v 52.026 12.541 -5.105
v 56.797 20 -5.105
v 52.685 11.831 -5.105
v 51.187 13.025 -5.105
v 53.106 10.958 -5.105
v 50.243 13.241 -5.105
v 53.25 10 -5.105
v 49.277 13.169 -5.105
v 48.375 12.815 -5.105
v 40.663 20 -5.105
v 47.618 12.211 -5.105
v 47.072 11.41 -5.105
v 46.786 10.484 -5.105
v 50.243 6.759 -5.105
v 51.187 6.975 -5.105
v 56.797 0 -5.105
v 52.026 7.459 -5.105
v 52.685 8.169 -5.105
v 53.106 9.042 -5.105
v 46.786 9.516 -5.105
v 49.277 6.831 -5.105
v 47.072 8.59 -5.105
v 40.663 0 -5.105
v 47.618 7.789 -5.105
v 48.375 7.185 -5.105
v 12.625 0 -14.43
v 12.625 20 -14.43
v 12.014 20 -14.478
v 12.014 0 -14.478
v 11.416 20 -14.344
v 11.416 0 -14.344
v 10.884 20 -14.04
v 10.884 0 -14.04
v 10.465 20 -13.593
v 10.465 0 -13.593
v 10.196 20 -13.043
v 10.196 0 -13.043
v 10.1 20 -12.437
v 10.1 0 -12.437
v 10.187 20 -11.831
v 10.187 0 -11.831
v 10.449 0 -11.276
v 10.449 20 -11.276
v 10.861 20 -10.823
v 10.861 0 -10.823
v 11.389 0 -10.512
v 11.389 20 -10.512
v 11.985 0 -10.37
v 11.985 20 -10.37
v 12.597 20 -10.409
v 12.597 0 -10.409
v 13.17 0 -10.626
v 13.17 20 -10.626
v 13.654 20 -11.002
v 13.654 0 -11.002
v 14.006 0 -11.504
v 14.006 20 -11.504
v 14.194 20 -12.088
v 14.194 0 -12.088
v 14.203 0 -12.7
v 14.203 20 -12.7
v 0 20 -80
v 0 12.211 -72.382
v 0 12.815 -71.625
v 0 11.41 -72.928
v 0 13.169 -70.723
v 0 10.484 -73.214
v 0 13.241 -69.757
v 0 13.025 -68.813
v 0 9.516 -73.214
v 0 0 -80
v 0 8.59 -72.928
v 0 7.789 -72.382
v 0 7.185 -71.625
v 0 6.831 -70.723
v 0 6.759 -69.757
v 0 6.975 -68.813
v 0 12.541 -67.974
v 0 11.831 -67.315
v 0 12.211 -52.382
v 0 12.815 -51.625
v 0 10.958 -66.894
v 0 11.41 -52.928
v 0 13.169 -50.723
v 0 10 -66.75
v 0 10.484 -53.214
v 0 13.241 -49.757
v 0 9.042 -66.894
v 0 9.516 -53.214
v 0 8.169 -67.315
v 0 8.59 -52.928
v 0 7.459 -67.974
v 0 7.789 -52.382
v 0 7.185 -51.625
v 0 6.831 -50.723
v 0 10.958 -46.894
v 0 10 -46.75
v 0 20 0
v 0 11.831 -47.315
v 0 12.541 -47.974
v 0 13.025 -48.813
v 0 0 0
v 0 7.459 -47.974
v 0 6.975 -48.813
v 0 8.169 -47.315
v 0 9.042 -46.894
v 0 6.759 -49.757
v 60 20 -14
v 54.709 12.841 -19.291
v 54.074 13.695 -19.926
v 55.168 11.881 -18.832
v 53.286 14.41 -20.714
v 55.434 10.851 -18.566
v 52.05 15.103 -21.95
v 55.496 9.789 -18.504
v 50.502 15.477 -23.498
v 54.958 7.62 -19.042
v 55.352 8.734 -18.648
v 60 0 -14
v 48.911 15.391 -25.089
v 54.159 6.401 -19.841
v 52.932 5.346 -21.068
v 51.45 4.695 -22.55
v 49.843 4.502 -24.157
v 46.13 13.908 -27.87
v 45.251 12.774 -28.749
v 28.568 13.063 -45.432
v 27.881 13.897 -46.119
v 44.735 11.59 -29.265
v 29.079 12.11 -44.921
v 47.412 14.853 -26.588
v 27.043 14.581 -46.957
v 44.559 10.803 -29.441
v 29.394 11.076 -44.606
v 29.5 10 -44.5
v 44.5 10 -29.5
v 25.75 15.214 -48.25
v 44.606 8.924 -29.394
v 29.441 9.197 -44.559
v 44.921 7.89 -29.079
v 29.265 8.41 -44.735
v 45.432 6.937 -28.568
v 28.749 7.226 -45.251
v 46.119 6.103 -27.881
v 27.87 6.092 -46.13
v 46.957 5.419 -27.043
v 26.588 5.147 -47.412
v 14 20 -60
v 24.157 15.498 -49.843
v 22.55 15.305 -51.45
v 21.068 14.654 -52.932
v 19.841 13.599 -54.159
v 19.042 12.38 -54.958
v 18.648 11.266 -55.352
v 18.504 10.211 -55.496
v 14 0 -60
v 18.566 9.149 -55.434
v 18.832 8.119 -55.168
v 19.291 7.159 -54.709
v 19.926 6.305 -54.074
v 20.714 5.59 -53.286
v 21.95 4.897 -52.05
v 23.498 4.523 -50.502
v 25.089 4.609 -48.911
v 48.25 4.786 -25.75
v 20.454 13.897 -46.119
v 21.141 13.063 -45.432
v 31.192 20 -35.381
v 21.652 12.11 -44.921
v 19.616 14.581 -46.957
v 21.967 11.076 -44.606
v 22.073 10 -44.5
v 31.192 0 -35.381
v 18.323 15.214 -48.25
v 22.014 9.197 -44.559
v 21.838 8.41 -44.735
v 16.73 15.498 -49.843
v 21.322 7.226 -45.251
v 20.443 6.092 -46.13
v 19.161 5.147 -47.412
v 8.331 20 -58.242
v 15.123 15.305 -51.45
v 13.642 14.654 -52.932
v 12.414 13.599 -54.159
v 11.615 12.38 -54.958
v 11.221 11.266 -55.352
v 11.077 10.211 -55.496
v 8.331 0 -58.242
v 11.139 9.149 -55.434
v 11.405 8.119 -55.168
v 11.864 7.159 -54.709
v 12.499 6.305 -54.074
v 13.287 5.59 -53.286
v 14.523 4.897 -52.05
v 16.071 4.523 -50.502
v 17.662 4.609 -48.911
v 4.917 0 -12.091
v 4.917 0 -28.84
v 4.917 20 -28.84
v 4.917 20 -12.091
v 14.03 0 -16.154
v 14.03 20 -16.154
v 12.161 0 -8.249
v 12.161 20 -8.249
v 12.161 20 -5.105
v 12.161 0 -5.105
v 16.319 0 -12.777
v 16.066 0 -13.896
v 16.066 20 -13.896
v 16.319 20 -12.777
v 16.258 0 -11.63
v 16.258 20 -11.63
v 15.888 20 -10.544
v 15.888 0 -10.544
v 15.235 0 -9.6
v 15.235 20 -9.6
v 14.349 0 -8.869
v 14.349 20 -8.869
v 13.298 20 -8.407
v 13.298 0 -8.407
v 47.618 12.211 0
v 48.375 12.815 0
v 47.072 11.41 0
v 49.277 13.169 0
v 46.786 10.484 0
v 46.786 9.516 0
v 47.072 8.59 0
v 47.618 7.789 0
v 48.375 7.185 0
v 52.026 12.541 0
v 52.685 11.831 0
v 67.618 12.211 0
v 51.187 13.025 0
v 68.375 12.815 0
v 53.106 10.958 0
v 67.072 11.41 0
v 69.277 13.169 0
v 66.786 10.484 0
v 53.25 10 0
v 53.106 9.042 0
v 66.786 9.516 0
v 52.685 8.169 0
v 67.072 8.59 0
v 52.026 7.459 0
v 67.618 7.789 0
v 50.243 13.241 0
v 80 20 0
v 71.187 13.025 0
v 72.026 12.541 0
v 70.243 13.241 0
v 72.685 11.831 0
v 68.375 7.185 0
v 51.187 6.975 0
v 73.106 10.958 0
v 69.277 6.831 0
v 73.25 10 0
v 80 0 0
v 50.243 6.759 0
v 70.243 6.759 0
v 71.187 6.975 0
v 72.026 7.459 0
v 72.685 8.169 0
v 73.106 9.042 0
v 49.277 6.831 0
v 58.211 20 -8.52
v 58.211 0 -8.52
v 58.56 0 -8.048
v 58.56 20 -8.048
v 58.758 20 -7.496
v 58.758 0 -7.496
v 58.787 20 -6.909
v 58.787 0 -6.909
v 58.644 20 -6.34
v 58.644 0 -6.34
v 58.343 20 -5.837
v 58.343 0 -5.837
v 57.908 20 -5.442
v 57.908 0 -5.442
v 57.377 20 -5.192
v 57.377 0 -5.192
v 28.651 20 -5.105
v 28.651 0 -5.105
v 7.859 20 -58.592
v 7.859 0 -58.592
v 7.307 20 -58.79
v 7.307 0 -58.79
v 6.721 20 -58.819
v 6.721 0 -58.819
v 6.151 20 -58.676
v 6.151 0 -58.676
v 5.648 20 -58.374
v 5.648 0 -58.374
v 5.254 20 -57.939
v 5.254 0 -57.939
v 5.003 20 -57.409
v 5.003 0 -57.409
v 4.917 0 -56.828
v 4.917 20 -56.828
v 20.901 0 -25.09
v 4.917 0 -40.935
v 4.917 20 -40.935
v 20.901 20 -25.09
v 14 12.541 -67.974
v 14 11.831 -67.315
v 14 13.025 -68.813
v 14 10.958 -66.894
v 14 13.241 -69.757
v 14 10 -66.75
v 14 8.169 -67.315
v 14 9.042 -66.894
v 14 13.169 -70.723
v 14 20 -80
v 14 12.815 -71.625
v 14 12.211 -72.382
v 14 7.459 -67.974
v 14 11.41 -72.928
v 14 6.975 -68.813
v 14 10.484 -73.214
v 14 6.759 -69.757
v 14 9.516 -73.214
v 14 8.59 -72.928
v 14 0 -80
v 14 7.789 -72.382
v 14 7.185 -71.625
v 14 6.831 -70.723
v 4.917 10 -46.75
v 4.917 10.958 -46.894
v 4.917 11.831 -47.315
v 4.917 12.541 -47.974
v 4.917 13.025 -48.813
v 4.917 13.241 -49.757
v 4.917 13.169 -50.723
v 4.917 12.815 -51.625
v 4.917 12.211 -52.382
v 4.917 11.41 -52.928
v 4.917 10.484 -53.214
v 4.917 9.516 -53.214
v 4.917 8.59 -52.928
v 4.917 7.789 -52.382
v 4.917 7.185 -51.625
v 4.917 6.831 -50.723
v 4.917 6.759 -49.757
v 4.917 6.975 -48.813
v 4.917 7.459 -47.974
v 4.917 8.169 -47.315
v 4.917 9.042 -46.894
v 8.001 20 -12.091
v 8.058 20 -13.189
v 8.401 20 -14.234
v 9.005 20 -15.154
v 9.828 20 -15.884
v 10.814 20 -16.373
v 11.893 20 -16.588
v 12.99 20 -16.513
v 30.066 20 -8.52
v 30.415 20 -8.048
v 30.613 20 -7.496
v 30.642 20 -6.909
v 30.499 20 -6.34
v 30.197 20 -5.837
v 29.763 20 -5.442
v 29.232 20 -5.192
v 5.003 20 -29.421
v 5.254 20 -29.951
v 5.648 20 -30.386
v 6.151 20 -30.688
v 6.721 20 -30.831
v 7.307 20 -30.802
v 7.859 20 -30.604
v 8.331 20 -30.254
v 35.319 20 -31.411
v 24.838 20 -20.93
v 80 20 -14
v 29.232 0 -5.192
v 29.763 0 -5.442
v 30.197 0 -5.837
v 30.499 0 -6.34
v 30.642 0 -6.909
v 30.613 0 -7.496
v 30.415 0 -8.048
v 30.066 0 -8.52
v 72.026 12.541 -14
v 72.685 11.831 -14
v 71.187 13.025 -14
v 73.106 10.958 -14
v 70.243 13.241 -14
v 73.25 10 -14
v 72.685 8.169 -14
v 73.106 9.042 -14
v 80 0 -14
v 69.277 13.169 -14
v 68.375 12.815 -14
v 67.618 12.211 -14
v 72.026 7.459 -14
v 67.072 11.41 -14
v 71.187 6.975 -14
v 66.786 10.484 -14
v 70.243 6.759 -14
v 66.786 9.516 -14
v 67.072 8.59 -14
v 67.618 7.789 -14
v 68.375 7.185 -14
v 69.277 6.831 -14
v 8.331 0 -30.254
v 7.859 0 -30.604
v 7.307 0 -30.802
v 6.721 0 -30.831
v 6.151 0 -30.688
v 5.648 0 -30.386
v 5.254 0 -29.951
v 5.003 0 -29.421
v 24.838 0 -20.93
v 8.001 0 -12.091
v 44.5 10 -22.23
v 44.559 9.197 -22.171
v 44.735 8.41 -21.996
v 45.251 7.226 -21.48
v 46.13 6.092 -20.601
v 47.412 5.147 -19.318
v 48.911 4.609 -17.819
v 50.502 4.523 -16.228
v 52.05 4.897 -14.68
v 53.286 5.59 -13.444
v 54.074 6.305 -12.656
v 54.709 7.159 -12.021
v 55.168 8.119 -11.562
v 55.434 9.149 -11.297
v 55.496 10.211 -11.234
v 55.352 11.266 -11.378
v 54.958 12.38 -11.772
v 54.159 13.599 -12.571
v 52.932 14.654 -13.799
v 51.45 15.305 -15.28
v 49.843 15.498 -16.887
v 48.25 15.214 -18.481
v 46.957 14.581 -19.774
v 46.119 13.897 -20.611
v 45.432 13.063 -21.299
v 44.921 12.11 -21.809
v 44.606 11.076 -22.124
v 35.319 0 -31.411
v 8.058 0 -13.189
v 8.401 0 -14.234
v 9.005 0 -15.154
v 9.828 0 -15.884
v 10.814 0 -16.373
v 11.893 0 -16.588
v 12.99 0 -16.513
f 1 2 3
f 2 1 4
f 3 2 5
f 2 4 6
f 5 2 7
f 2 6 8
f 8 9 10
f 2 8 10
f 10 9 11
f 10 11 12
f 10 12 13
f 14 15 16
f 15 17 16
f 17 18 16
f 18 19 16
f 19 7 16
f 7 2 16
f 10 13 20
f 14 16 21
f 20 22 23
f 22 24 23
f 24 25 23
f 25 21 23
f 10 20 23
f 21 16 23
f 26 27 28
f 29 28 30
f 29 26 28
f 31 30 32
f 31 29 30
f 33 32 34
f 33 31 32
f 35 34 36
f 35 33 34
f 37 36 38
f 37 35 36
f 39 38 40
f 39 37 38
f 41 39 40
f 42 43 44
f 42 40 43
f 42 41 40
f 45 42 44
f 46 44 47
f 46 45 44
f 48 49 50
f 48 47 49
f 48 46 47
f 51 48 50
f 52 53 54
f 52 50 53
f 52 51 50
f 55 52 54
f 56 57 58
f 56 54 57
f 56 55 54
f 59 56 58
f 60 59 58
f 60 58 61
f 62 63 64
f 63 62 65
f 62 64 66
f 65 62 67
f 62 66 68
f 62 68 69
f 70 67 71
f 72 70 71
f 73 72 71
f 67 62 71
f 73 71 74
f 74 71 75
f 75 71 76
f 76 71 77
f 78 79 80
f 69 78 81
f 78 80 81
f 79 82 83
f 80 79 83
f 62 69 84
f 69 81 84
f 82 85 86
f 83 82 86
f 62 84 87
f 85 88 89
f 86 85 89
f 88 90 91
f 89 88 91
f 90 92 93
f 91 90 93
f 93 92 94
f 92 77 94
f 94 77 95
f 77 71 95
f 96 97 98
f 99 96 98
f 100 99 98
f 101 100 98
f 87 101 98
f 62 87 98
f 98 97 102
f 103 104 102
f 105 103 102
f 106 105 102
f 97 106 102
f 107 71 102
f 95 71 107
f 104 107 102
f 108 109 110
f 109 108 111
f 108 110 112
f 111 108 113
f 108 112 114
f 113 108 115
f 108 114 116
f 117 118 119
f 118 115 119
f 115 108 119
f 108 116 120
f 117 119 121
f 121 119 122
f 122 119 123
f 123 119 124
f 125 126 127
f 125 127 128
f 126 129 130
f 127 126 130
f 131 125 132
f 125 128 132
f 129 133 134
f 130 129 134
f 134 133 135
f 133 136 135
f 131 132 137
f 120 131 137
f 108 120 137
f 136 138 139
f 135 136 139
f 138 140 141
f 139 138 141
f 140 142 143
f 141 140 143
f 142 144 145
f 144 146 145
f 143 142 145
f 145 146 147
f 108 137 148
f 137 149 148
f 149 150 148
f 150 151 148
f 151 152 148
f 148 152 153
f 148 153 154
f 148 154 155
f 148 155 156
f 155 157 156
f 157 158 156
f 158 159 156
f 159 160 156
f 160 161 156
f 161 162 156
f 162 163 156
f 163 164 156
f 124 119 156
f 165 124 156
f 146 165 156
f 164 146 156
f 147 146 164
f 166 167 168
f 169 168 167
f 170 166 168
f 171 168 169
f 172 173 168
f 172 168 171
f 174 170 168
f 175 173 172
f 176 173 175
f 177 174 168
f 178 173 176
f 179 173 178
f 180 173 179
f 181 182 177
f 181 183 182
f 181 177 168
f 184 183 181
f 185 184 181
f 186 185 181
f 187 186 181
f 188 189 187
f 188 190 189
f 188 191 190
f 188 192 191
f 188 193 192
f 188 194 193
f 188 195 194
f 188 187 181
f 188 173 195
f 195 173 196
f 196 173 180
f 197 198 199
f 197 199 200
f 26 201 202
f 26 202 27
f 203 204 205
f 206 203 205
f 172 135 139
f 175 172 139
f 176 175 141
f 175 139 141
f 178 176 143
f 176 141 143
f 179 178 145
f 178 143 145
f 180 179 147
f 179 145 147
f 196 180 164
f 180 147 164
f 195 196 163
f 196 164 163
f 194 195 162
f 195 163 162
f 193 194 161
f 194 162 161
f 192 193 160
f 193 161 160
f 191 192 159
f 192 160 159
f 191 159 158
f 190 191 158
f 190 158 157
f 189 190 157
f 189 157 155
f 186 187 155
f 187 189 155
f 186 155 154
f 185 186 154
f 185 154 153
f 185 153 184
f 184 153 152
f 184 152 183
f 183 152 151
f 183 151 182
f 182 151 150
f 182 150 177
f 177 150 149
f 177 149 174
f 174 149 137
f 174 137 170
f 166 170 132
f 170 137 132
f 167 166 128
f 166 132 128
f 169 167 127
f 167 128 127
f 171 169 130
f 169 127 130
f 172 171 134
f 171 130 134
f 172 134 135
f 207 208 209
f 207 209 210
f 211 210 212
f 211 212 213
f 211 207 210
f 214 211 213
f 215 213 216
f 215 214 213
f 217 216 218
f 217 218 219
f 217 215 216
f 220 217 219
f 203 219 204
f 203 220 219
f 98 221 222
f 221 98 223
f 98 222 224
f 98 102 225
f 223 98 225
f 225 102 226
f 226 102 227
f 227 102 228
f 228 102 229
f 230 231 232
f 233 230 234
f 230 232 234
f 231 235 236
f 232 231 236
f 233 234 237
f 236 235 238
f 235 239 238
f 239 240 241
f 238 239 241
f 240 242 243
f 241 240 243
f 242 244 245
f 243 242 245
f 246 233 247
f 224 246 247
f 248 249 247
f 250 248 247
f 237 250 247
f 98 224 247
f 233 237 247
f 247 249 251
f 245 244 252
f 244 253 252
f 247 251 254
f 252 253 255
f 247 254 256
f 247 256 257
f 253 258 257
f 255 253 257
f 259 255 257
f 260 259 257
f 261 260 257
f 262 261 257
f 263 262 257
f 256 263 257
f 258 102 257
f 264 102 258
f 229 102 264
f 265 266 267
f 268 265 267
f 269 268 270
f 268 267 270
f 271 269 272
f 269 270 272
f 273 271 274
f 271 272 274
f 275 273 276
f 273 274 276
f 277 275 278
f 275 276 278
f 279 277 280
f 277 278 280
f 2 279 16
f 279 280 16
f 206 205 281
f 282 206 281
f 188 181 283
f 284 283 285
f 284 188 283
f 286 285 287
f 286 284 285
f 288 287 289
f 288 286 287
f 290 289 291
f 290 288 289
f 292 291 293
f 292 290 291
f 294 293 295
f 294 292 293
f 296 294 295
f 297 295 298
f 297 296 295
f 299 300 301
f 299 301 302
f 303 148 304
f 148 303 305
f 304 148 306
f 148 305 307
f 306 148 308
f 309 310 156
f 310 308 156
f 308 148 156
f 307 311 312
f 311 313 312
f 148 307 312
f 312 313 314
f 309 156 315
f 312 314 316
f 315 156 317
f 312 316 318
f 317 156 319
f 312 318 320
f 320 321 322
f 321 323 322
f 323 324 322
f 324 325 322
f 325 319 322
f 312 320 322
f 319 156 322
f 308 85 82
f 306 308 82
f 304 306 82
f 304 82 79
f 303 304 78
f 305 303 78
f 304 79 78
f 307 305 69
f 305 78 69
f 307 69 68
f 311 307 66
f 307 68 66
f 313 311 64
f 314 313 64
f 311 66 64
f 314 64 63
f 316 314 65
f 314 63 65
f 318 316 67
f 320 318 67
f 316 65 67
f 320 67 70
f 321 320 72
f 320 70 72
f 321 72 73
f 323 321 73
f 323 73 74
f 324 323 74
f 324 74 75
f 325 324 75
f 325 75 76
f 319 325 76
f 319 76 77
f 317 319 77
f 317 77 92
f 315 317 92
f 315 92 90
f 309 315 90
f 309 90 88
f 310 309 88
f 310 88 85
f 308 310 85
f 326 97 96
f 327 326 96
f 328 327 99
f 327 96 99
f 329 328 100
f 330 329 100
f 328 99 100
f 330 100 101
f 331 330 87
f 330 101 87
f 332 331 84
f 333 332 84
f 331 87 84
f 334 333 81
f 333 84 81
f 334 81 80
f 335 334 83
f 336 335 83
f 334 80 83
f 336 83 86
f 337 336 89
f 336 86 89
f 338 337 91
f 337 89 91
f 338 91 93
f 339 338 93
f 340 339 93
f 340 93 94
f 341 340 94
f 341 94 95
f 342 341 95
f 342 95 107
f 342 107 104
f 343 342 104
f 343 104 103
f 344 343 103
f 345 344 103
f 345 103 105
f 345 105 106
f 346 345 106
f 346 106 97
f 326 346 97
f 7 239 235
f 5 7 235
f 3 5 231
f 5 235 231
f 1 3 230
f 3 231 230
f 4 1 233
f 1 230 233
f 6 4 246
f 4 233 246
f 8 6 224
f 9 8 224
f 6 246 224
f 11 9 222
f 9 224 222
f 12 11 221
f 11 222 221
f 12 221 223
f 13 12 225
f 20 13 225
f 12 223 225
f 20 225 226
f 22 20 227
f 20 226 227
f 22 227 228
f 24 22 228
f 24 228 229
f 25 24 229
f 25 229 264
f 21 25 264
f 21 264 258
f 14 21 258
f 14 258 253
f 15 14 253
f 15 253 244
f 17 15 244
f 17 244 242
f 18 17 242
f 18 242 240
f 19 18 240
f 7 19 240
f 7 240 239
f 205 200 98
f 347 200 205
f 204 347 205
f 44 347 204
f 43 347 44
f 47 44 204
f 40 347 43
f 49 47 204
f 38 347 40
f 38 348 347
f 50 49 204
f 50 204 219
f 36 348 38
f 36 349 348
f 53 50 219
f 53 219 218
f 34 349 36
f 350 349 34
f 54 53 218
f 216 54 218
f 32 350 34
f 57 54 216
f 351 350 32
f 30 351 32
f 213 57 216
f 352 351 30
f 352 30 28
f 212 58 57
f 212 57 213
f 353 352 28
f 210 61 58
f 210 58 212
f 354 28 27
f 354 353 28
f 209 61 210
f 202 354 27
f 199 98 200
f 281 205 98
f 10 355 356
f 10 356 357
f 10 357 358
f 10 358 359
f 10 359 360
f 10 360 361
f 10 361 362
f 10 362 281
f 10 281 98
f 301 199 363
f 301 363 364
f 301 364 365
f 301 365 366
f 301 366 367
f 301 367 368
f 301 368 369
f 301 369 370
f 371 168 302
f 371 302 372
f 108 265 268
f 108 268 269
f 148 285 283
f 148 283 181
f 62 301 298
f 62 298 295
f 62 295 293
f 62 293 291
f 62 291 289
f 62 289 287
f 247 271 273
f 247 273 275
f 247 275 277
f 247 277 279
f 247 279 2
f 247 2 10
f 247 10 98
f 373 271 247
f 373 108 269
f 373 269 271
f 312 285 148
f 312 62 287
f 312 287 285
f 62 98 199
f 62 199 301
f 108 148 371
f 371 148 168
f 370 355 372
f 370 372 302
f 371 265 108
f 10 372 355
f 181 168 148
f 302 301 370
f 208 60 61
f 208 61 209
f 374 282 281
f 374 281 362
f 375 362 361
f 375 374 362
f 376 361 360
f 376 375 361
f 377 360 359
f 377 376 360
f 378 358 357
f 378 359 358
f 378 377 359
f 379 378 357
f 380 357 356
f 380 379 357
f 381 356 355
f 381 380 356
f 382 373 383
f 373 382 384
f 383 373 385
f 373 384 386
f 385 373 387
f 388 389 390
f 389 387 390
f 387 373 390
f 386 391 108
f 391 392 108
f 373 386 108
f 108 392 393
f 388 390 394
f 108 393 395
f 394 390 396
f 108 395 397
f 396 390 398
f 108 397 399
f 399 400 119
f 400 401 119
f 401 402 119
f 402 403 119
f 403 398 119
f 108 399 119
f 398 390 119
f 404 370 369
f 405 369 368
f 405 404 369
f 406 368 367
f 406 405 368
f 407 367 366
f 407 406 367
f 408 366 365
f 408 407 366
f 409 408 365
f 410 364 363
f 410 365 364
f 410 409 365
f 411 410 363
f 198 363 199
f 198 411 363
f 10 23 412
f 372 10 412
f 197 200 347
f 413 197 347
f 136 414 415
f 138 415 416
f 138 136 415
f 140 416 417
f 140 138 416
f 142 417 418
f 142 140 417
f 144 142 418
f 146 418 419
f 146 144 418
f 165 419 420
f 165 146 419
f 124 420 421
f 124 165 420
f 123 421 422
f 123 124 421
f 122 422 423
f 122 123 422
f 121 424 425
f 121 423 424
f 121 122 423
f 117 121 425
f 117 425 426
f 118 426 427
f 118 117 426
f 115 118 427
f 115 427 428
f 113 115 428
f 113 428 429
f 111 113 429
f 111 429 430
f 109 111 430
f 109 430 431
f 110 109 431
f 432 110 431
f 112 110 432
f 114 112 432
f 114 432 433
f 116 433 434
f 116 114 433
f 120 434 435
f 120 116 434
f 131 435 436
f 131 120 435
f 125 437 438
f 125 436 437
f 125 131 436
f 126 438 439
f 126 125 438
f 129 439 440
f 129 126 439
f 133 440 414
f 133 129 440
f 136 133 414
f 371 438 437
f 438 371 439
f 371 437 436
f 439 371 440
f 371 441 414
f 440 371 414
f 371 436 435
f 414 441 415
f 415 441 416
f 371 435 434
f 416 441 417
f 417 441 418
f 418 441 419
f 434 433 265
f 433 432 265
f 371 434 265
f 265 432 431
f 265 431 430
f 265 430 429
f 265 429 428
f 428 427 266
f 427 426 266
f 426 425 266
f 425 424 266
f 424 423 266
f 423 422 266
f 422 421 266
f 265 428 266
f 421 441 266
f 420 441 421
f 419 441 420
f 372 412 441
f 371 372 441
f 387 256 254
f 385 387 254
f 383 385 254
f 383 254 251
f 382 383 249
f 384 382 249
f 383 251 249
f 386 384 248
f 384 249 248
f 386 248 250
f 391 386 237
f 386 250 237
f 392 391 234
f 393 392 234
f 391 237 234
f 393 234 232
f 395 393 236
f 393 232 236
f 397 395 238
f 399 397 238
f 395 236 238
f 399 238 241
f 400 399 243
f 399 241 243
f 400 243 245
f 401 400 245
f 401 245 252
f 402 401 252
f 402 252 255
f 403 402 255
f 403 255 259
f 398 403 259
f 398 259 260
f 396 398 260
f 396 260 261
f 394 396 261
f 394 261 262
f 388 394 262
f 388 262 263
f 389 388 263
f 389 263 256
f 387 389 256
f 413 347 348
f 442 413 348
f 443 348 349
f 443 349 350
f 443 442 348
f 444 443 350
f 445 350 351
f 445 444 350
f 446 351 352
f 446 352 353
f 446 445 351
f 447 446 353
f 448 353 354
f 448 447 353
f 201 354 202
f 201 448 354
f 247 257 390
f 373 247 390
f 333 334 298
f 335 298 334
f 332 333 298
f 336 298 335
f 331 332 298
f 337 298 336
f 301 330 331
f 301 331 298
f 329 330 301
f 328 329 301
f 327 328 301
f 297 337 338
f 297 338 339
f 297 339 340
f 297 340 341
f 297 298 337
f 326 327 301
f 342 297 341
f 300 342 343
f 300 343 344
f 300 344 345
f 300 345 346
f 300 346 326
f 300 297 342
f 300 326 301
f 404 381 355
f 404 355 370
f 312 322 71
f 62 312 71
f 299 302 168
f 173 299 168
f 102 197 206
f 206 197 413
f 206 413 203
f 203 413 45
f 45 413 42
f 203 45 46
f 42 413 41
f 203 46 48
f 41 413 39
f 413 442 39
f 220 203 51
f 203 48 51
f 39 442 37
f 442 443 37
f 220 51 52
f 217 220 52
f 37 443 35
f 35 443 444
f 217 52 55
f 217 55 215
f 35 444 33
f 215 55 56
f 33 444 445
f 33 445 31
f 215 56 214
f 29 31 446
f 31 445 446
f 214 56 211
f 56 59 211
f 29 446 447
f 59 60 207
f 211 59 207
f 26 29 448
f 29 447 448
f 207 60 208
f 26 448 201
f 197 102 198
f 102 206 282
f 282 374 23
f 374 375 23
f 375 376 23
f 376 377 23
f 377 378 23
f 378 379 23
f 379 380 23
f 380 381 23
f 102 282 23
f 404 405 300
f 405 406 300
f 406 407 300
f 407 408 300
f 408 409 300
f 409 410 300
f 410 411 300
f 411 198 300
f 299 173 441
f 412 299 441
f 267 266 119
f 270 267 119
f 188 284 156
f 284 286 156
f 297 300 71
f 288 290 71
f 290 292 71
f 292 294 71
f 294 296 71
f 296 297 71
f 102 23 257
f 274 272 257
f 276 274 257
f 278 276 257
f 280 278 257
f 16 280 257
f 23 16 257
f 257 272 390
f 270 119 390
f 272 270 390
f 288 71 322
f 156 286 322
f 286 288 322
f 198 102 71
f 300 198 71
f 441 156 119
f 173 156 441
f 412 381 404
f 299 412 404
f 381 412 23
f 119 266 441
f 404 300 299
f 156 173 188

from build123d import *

# Parameters (mm, degrees)
EXTRUDE_1_DEPTH     = 20
SKETCH_2_R          = 3.25
CUT_EXTRUDE_1_DEPTH = 115.891252931
SKETCH_3_R          = 3.25
CUT_EXTRUDE_2_DEPTH = 115.891252931
CUT_EXTRUDE_3_DEPTH = 115.891252931
SKETCH_7_R          = 5.5
CUT_EXTRUDE_4_DEPTH = 25
SKETCH_8_R          = 5.5
CUT_EXTRUDE_5_DEPTH = 25


with BuildPart() as part:
    # 草图1 → 凸台-拉伸1 (new body)
    with BuildSketch(Plane(origin=(0, 0, 0), x_dir=(1, 0, 0), z_dir=(0, 1, 0))):
        Polygon((0, 80), (0, 0), (80, 0), (80, 14), (60, 14), (14, 60), (14, 80), align=None)
    extrude(amount=EXTRUDE_1_DEPTH)

    # 草图2 → 切除-拉伸1 (cut, through all)
    with BuildSketch(Plane.ZY):
        with Locations((-70, 10)):
            Circle(SKETCH_2_R)
        with Locations((-50, 10)):
            Circle(SKETCH_2_R)
    extrude(amount=-CUT_EXTRUDE_1_DEPTH, mode=Mode.SUBTRACT)

    # 草图3 → 切除-拉伸2 (cut, through all)
    with BuildSketch(Plane.XY):
        with Locations((70, 10)):
            Circle(SKETCH_3_R)
        with Locations((50, 10)):
            Circle(SKETCH_3_R)
    extrude(amount=-CUT_EXTRUDE_2_DEPTH, mode=Mode.SUBTRACT)

    # 草图4 → 切除-拉伸3 (cut, through all)
    with BuildSketch(Plane.XZ):
        with BuildLine():
            Line((20.901080392, -25.090385961), (31.191934333, -35.381239902))
            Line((31.191934333, -35.381239902), (8.330781791, -58.242392444))
            ThreePointArc((8.330781791, -58.242392444), (6.151201363, -58.675937947), (4.916568228, -56.828178882))
            Line((4.916568228, -56.828178882), (4.916568228, -40.934892559))
            Line((4.916568228, -40.934892559), (20.901080392, -25.090385961))
        make_face()
        with BuildLine():
            Line((24.837924499, -20.930281625), (35.319025282, -31.411382408))
            Line((35.319025282, -31.411382408), (58.210769263, -8.519638426))
            ThreePointArc((58.210769263, -8.519638426), (58.644314766, -6.340057999), (56.796555701, -5.105424864))
            Line((56.796555701, -5.105424864), (40.662781261, -5.105424864))
            Line((40.662781261, -5.105424864), (24.837924499, -20.930281625))
        make_face()
        with BuildLine():
            Line((12.160826912, -5.105424864), (28.651360093, -5.105424864))
            ThreePointArc((28.651360093, -5.105424864), (30.499119158, -6.340057999), (30.065573655, -8.519638426))
            Line((30.065573655, -8.519638426), (8.330781791, -30.254430291))
            ThreePointArc((8.330781791, -30.254430291), (6.151201363, -30.687975793), (4.916568228, -28.840216728))
            Line((4.916568228, -28.840216728), (4.916568228, -12.090508469))
            Line((4.916568228, -12.090508469), (8.000520281, -12.090508469))
            ThreePointArc((8.000520281, -12.090508469), (9.82829842, -15.883616127), (14.030107382, -16.154245149))
            Line((14.030107382, -16.154245149), (12.625484958, -14.430268904))
            ThreePointArc((12.625484958, -14.430268904), (10.638085741, -11.03439689), (14.202657003, -12.700390319))
            Line((14.202657003, -12.700390319), (16.06551283, -13.896467584))
            ThreePointArc((16.06551283, -13.896467584), (15.593703645, -10.049139087), (12.160826912, -8.249167474))
            Line((12.160826912, -8.249167474), (12.160826912, -5.105424864))
        make_face()
    extrude(amount=-CUT_EXTRUDE_3_DEPTH, mode=Mode.SUBTRACT)

    # 草图7 → 切除-拉伸4 (cut)
    with BuildSketch(Plane.XY.offset(-35)):
        with Locations(Location((50, 10, 0), (0, 0, 180))):
            Circle(SKETCH_7_R)
    extrude(amount=CUT_EXTRUDE_4_DEPTH, mode=Mode.SUBTRACT)

    # 草图8 → 切除-拉伸5 (cut)
    with BuildSketch(Plane(origin=(35, 0, 0), x_dir=(0, 0, -1), z_dir=(1, 0, 0))):
        with Locations(Location((50, 10, 0), (0, 0, 180))):
            Circle(SKETCH_8_R)
    extrude(amount=-CUT_EXTRUDE_5_DEPTH, mode=Mode.SUBTRACT)


solid = part.part
